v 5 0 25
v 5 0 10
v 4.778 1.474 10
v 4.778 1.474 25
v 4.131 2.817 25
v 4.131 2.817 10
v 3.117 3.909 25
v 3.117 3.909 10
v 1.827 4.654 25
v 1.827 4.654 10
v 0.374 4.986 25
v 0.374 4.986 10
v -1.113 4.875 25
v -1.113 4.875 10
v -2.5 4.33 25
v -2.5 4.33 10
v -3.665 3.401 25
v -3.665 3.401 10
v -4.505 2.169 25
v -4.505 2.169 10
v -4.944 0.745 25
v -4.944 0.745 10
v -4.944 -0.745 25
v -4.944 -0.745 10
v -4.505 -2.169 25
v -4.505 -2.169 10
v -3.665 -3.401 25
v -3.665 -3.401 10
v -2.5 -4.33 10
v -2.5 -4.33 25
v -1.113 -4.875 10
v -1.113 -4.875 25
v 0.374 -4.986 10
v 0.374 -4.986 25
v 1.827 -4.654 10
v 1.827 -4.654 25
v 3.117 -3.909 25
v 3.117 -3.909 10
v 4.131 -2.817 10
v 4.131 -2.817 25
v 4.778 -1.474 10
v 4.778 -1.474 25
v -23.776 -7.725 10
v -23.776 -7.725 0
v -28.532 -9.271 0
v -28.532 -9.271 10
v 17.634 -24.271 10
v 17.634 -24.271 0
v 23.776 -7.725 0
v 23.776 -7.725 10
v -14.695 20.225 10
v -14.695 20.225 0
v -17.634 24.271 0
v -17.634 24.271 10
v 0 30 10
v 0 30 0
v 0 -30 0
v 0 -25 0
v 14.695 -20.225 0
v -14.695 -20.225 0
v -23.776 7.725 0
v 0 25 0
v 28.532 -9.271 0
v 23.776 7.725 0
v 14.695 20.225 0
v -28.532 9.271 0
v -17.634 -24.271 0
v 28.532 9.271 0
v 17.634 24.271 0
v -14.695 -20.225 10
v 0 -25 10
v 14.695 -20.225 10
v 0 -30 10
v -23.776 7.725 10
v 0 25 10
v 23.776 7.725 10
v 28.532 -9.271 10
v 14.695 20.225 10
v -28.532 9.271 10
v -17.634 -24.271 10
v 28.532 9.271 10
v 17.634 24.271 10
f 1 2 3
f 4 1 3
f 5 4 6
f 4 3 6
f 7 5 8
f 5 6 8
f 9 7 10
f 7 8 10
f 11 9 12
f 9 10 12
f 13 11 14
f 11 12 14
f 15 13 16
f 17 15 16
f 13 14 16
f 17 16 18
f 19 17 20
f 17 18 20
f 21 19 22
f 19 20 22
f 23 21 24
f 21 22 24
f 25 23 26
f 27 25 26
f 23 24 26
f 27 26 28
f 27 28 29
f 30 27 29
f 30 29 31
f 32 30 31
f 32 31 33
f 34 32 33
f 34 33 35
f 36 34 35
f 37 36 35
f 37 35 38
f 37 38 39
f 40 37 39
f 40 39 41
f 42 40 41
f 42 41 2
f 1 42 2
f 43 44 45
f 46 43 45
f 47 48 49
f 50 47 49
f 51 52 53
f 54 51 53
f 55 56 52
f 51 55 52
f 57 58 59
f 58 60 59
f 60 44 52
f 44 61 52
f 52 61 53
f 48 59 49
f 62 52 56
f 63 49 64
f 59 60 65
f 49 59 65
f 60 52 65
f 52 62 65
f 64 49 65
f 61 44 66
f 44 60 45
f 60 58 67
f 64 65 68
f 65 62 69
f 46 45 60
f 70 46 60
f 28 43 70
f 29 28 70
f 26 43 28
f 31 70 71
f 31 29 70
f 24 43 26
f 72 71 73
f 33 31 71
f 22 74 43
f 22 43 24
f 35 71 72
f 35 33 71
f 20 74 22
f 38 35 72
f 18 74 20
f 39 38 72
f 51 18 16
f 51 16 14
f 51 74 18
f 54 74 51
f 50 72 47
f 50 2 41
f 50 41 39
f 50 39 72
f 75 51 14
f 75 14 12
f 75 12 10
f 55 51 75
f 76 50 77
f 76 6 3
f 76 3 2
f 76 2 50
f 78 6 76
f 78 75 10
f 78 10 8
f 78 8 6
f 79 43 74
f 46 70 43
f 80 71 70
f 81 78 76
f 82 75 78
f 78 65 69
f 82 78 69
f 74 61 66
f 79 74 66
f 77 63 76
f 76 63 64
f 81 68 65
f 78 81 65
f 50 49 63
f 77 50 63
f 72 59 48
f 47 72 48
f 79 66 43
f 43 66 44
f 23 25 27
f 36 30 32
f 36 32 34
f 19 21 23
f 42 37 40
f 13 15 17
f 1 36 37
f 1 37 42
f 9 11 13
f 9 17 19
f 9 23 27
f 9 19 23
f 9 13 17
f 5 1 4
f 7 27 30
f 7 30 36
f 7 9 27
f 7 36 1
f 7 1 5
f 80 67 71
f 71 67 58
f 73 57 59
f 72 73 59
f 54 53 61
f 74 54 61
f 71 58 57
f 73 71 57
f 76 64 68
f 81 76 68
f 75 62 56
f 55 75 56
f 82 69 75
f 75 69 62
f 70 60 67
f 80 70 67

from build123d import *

# Parameters (mm, degrees)
F1_DEPTH = 10
F2_R     = 5
F3_DEPTH = 25
F4_R     = 5
F5_DEPTH = 10


with BuildPart() as f1:
    # F0 (on Top) → F1 (new body)
    with BuildSketch(Plane.XY):
        Polygon((0, 25), (0, 30), (-14.694631, 20.225425), (-17.633558, 24.27051), (-23.776413, 7.725425), (-28.531695, 9.27051), (-23.776413, -7.725425), (-28.531695, -9.27051), (-14.694631, -20.225425), (-17.633558, -24.27051), (0, -25), (0, -30), (14.694631, -20.225425), (17.633558, -24.27051), (23.776413, -7.725425), (28.531695, -9.27051), (23.776413, 7.725425), (28.531695, 9.27051), (14.694631, 20.225425), (17.633558, 24.27051), align=None)
    extrude(amount=F1_DEPTH)

    # F2 (on Top) → F3 (join)
    with BuildSketch(Plane.XY):
        Circle(F2_R)
    extrude(amount=F3_DEPTH)

    # F4 (on Top) → F5 (join)
    with BuildSketch(Plane.XY):
        Circle(F4_R)
    extrude(amount=F5_DEPTH)


solid = f1.part
